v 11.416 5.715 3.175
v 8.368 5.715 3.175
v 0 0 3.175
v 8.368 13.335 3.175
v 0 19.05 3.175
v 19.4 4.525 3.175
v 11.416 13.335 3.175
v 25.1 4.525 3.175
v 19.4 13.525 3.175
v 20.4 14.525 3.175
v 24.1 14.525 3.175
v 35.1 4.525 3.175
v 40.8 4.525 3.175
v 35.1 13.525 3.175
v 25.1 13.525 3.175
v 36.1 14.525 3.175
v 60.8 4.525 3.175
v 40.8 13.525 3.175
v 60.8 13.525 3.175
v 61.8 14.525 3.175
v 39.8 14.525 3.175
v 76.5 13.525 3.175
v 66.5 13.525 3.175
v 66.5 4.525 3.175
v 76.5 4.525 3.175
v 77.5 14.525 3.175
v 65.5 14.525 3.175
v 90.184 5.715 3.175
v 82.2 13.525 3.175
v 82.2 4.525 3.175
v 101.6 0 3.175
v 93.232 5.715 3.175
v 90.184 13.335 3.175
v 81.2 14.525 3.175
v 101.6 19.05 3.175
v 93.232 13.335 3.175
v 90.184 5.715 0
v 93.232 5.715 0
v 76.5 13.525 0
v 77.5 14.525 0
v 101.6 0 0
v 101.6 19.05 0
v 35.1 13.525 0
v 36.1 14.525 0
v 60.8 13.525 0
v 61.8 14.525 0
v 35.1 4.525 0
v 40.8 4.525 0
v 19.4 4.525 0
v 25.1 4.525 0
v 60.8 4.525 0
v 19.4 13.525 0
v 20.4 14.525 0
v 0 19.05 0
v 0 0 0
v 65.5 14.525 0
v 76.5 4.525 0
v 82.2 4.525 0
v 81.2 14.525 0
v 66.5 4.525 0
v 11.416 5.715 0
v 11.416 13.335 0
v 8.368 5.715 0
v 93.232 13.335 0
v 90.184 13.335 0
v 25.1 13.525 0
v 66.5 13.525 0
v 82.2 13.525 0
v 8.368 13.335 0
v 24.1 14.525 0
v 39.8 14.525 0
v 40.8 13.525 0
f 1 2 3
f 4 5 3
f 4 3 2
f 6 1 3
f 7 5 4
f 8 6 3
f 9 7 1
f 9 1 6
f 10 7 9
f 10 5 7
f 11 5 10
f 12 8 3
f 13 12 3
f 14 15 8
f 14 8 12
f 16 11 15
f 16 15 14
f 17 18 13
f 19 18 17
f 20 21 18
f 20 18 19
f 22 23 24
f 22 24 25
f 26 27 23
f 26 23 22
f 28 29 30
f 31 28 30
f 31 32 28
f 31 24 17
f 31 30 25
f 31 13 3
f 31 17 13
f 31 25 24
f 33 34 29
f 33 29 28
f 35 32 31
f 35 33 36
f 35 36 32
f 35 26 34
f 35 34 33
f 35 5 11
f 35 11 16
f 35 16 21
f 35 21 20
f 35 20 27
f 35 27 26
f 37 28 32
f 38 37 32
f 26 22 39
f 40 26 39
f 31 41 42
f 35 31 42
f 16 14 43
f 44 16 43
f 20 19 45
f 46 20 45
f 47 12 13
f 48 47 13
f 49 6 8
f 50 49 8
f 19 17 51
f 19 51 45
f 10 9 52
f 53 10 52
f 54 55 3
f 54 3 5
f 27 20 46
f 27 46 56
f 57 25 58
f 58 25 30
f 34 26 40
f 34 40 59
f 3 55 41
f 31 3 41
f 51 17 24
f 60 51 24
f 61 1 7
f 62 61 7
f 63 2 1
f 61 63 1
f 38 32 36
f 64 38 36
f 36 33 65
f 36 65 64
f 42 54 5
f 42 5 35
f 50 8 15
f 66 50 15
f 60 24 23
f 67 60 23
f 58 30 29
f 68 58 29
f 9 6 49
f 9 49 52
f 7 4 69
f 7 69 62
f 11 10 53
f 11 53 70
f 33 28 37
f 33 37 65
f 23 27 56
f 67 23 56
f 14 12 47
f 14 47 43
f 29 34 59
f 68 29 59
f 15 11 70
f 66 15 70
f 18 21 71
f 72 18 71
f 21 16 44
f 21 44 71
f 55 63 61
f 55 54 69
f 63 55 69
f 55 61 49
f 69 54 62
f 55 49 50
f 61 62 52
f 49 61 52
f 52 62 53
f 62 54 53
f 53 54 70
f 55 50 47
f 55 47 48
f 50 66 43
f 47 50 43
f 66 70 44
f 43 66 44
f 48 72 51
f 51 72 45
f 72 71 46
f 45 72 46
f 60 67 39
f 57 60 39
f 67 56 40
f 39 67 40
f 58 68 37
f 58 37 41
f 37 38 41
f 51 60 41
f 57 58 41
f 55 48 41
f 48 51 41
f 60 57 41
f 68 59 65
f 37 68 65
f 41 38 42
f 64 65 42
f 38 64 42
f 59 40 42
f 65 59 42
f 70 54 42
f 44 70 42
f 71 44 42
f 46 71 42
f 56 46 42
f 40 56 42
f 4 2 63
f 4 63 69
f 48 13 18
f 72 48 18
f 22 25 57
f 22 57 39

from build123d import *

# Parameters (mm, degrees)
SKETCH1_W           = 101.6
SKETCH1_H           = 19.05
BOSS_EXTRUDE1_DEPTH = 3.175
SKETCH2_W           = 3.048
SKETCH2_H           = 7.62
CUT_EXTRUDE1_DEPTH  = 4.175
SKETCH3_W           = 5.7
SKETCH3_H           = 10
CUT_EXTRUDE2_DEPTH  = 4.175
CHAMFER1_SIZE       = 1


with BuildPart() as part:
    # Sketch1 → Boss-Extrude1 (new body)
    with BuildSketch(Plane.XY):
        with Locations((50.8, 9.525)):
            Rectangle(SKETCH1_W, SKETCH1_H)
    extrude(amount=BOSS_EXTRUDE1_DEPTH)

    # Sketch2 → Cut-Extrude1 (cut, through all)
    with BuildSketch(Plane.XY.offset(3.175)):
        with Locations((9.892117884, 9.525)):
            Rectangle(SKETCH2_W, SKETCH2_H)
        with Locations((91.707882116, 9.525)):
            Rectangle(SKETCH2_W, SKETCH2_H)
    extrude(amount=-CUT_EXTRUDE1_DEPTH, mode=Mode.SUBTRACT)

    # Sketch3 → Cut-Extrude2 (cut, through all)
    with BuildSketch(Plane.XY.offset(3.175)):
        with Locations((37.95, 9.525)):
            Rectangle(SKETCH3_W, SKETCH3_H)
        with Locations((63.65, 9.525)):
            Rectangle(SKETCH3_W, SKETCH3_H)
        with Locations((79.35, 9.525)):
            Rectangle(SKETCH3_W, SKETCH3_H)
        with Locations((22.25, 9.525)):
            Rectangle(SKETCH3_W, SKETCH3_H)
    extrude(amount=-CUT_EXTRUDE2_DEPTH, mode=Mode.SUBTRACT)

    # Chamfer1
    chamfer1_edges = [part.edges().sort_by_distance(p)[0] for p in [
        (76.5, 14.525, 1.5875),
        (82.2, 14.525, 1.5875),
        (19.4, 14.525, 1.5875),
        (25.1, 14.525, 1.5875),
        (60.8, 14.525, 1.5875),
        (66.5, 14.525, 1.5875),
        (35.1, 14.525, 1.5875),
        (40.8, 14.525, 1.5875),
    ]]
    chamfer(chamfer1_edges, length=CHAMFER1_SIZE)


solid = part.part
